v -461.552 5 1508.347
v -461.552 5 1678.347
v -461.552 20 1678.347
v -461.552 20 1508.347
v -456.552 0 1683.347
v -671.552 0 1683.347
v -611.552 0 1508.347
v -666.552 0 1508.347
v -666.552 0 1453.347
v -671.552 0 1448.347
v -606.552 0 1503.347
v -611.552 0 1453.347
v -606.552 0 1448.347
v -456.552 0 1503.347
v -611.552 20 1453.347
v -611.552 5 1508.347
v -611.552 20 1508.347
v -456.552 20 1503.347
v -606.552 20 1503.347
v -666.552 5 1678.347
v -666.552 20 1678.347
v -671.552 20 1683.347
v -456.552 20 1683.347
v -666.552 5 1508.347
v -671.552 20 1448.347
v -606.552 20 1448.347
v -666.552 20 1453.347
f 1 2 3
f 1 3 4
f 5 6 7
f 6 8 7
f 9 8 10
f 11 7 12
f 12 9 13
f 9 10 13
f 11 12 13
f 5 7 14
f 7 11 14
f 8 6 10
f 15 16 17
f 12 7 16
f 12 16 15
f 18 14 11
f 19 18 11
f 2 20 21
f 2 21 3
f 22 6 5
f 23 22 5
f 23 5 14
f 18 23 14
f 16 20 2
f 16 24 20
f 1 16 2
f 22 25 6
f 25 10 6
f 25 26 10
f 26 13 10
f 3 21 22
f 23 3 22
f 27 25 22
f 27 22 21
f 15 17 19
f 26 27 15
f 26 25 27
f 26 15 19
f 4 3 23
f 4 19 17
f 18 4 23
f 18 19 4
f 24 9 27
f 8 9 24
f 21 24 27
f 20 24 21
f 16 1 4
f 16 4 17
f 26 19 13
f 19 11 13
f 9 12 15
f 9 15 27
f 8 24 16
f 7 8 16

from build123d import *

# Parameters (mm, degrees)
EXTRUDE_1_OUTLINE_W = 215
EXTRUDE_1_OUTLINE_H = 235
EXTRUDE_1_DEPTH     = 5
SKETCH_3_W          = 150
SKETCH_3_H          = 55
CUT_EXTRUDE_1_DEPTH = 1813.363972104
EXTRUDE_1_2_DEPTH   = 15
SKETCH_5_W          = 55
SKETCH_5_H          = 55
CUT_EXTRUDE_2_DEPTH = 1813.419147819


# Read off the part's stored shape, not the designer's step: 凸台-拉伸1
with BuildPart() as part:
    # Extrude 1 outline → Extrude 1 (new body)
    with BuildSketch(Plane(origin=(0, 0, 0), x_dir=(1, 0, 0), z_dir=(0, 1, 0))):
        with Locations((-564.05165919, -1565.846825945)):
            Rectangle(EXTRUDE_1_OUTLINE_W, EXTRUDE_1_OUTLINE_H)
    extrude(amount=EXTRUDE_1_DEPTH)

    # 草图3 → 切除-拉伸1 (cut, through all)
    with BuildSketch(Plane(origin=(0, 5, 0), x_dir=(1, 0, 0), z_dir=(0, 1, 0))):
        with Locations((-531.55165919, -1475.846825945)):
            Rectangle(SKETCH_3_W, SKETCH_3_H)
    extrude(amount=-CUT_EXTRUDE_1_DEPTH, mode=Mode.SUBTRACT)

    # 草图4 → Extrude 1 2 (add)
    with BuildSketch(Plane(origin=(0, 5, 0), x_dir=(1, 0, 0), z_dir=(0, 1, 0))):
        Polygon((-456.55165919, -1503.346825945), (-606.55165919, -1503.346825945), (-606.55165919, -1448.346825945), (-671.55165919, -1448.346825945), (-671.55165919, -1683.346825945), (-456.55165919, -1683.346825945), align=None)
        Polygon((-461.55165919, -1508.346825945), (-611.55165919, -1508.346825945), (-611.55165919, -1453.346825945), (-666.55165919, -1453.346825945), (-666.55165919, -1678.346825945), (-461.55165919, -1678.346825945), align=None, mode=Mode.SUBTRACT)
    extrude(amount=EXTRUDE_1_2_DEPTH)

    # 草图5 → 切除-拉伸2 (cut, through all)
    with BuildSketch(Plane(origin=(0, 5, 0), x_dir=(1, 0, 0), z_dir=(0, 1, 0))):
        with Locations((-639.05165919, -1480.846825945)):
            Rectangle(SKETCH_5_W, SKETCH_5_H)
    extrude(amount=-CUT_EXTRUDE_2_DEPTH, mode=Mode.SUBTRACT)


solid = part.part
